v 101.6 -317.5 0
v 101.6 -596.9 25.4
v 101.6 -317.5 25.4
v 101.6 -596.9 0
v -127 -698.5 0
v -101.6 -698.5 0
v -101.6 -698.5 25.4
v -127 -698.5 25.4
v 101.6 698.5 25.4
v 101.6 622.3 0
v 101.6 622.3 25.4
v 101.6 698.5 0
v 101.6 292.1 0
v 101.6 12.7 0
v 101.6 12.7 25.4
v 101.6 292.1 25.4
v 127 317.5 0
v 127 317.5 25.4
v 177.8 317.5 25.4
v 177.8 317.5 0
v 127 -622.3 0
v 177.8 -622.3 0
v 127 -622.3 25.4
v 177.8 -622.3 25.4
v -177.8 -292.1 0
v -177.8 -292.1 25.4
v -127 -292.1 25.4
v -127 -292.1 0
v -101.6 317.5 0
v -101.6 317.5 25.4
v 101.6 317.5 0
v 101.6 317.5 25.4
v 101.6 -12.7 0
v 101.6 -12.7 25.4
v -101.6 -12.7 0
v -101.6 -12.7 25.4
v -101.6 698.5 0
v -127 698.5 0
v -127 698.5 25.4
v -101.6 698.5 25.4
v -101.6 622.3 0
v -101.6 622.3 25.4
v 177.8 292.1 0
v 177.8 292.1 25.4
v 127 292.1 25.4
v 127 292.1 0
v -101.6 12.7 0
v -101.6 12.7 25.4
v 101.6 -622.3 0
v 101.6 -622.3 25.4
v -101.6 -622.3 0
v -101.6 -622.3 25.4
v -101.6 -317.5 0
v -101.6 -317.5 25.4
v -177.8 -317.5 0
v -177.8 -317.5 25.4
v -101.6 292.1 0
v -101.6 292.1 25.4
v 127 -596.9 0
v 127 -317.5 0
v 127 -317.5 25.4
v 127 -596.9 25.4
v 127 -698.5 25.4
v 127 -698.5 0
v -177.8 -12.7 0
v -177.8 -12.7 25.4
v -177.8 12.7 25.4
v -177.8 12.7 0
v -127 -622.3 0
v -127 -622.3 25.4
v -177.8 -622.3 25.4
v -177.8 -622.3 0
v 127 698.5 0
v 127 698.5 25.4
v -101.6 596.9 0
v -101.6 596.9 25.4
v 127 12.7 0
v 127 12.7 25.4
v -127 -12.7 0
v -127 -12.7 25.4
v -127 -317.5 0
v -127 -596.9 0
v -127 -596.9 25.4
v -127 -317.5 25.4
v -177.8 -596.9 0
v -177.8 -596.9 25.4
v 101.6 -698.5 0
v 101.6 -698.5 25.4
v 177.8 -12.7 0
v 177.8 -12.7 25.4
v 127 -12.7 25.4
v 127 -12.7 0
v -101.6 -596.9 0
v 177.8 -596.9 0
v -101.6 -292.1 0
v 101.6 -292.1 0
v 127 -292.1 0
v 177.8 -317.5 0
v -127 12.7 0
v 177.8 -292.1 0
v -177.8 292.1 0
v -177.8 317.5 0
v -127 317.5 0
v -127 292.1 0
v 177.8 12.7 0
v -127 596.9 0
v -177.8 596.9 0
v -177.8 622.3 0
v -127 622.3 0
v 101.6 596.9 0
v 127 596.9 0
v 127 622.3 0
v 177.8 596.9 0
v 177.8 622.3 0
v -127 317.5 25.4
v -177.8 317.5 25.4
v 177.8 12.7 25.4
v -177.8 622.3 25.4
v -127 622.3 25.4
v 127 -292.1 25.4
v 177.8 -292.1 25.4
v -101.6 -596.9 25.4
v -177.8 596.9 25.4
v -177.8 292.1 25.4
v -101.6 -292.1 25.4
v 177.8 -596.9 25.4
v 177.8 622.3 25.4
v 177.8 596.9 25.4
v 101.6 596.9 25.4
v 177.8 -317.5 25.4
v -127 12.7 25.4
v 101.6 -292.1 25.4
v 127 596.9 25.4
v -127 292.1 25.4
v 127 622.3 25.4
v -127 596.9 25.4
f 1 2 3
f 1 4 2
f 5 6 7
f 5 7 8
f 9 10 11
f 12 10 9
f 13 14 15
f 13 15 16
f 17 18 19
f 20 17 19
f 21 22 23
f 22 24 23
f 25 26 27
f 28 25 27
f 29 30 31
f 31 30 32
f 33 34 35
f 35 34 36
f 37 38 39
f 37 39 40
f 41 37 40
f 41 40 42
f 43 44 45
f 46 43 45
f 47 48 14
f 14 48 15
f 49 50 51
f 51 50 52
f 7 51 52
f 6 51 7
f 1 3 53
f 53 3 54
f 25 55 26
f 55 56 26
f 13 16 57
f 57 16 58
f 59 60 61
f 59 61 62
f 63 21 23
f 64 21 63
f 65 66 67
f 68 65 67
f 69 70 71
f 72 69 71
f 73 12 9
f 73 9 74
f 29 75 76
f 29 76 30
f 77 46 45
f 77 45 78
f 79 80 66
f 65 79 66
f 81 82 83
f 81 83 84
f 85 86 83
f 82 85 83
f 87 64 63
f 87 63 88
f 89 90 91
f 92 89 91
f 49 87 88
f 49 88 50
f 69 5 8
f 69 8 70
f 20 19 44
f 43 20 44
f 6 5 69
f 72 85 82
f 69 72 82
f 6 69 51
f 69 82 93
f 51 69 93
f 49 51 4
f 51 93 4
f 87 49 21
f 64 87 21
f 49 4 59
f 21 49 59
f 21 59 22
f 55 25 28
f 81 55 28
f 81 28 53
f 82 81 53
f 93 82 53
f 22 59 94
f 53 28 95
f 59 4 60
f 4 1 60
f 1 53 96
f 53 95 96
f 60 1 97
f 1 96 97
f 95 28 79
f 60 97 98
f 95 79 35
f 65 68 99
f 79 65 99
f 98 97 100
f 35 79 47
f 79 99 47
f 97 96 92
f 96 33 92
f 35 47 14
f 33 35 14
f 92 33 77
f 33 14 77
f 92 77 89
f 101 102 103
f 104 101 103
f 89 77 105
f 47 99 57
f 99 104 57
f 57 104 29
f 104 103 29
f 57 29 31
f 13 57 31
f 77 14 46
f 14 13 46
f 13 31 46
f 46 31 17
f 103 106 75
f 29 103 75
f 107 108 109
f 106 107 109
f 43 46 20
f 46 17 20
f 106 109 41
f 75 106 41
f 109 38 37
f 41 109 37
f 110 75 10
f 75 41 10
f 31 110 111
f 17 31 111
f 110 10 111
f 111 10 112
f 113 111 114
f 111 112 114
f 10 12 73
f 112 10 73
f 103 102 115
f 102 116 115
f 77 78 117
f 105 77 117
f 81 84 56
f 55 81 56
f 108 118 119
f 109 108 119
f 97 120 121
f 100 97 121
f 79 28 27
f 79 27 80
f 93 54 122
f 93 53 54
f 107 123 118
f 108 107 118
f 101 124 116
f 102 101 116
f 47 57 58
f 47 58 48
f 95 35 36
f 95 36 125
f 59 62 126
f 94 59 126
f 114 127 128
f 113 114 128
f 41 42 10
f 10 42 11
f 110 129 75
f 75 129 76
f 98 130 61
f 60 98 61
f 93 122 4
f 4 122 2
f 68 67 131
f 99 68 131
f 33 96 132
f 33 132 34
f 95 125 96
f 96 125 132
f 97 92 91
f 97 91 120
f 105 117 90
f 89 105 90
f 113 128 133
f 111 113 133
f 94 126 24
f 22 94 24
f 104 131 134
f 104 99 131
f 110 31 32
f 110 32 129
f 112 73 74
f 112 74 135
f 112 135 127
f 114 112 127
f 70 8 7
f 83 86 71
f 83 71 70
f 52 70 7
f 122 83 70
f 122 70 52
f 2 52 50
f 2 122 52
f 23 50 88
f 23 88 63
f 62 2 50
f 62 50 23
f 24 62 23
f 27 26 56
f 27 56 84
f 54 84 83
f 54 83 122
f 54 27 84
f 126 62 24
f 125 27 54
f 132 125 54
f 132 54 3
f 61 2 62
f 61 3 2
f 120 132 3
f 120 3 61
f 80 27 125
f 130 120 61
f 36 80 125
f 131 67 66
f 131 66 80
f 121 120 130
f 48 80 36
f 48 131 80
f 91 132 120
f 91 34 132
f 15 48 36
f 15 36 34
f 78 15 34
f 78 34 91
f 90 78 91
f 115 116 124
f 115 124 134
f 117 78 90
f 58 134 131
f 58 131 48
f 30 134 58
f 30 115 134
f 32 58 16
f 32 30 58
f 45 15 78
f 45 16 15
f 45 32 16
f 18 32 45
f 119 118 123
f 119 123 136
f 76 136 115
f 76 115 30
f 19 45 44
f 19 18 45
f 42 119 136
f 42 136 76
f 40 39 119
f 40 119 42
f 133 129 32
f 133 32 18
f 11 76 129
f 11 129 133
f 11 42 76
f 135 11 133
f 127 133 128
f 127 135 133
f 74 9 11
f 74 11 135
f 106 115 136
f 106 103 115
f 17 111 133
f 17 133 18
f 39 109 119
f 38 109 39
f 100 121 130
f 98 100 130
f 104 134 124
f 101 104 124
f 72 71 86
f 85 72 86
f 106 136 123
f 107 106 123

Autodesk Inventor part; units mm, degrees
ref_plane "YZ Plane" through (0, 0, 0) normal (1, 0, 0) x (0, 1, 0)
ref_plane "XZ Plane" through (0, 0, 0) normal (0, 1, 0) x (-1, 0, 0)
ref_plane "XY Plane" through (0, 0, 0) normal (0, 0, 1) x (1, 0, 0)
sketch "Sketch1" plane through (0, 0, 0) normal (0, 0, 1) x (1, 0, 0)
  line L0 (-127, 698.5) -> (-101.6, 698.5)
  line L1 (-101.6, 698.5) -> (-101.6, -698.5)
  line L2 (-101.6, -698.5) -> (-127, -698.5)
  line L3 (-127, -698.5) -> (-127, 698.5)
  line L4 (101.6, 698.5) -> (127, 698.5)
  line L5 (127, 698.5) -> (127, -698.5)
  line L6 (127, -698.5) -> (101.6, -698.5)
  line L7 (101.6, -698.5) -> (101.6, 698.5)
  line L8 (0, 0) -> (0, 143.5331) construction
  line L9 (0, 0) -> (-211.7363, 0) construction
  dimension "d0" = 25.4
  dimension "d1" = 1397
  dimension "d2" = 203.2
extrude "Extrusion1" add sketch "Sketch1" along normal blind 25.4
sketch "Sketch2" plane through (0, 0, 25.4) normal (0, 0, 1) x (1, 0, 0)
  line L0 (-177.8, 622.3) -> (177.8, 622.3)
  line L1 (177.8, 622.3) -> (177.8, 596.9)
  line L2 (177.8, 596.9) -> (-177.8, 596.9)
  line L3 (-177.8, 596.9) -> (-177.8, 622.3)
  line L4 (0, 0) -> (0, 410.334) construction
  line L5 (127, 698.5) -> (101.6, 698.5) construction
  dimension "d5" = 25.4
  dimension "d6" = 355.6
  dimension "d7" = 76.2
extrude "Extrusion2" add sketch "Sketch2" against normal blind 25.4
pattern_linear "Rectangular Pattern1" count 5 spacing 304.8 along (0, -1, 0) of "Extrusion2"
properties part number "Rail zone"
